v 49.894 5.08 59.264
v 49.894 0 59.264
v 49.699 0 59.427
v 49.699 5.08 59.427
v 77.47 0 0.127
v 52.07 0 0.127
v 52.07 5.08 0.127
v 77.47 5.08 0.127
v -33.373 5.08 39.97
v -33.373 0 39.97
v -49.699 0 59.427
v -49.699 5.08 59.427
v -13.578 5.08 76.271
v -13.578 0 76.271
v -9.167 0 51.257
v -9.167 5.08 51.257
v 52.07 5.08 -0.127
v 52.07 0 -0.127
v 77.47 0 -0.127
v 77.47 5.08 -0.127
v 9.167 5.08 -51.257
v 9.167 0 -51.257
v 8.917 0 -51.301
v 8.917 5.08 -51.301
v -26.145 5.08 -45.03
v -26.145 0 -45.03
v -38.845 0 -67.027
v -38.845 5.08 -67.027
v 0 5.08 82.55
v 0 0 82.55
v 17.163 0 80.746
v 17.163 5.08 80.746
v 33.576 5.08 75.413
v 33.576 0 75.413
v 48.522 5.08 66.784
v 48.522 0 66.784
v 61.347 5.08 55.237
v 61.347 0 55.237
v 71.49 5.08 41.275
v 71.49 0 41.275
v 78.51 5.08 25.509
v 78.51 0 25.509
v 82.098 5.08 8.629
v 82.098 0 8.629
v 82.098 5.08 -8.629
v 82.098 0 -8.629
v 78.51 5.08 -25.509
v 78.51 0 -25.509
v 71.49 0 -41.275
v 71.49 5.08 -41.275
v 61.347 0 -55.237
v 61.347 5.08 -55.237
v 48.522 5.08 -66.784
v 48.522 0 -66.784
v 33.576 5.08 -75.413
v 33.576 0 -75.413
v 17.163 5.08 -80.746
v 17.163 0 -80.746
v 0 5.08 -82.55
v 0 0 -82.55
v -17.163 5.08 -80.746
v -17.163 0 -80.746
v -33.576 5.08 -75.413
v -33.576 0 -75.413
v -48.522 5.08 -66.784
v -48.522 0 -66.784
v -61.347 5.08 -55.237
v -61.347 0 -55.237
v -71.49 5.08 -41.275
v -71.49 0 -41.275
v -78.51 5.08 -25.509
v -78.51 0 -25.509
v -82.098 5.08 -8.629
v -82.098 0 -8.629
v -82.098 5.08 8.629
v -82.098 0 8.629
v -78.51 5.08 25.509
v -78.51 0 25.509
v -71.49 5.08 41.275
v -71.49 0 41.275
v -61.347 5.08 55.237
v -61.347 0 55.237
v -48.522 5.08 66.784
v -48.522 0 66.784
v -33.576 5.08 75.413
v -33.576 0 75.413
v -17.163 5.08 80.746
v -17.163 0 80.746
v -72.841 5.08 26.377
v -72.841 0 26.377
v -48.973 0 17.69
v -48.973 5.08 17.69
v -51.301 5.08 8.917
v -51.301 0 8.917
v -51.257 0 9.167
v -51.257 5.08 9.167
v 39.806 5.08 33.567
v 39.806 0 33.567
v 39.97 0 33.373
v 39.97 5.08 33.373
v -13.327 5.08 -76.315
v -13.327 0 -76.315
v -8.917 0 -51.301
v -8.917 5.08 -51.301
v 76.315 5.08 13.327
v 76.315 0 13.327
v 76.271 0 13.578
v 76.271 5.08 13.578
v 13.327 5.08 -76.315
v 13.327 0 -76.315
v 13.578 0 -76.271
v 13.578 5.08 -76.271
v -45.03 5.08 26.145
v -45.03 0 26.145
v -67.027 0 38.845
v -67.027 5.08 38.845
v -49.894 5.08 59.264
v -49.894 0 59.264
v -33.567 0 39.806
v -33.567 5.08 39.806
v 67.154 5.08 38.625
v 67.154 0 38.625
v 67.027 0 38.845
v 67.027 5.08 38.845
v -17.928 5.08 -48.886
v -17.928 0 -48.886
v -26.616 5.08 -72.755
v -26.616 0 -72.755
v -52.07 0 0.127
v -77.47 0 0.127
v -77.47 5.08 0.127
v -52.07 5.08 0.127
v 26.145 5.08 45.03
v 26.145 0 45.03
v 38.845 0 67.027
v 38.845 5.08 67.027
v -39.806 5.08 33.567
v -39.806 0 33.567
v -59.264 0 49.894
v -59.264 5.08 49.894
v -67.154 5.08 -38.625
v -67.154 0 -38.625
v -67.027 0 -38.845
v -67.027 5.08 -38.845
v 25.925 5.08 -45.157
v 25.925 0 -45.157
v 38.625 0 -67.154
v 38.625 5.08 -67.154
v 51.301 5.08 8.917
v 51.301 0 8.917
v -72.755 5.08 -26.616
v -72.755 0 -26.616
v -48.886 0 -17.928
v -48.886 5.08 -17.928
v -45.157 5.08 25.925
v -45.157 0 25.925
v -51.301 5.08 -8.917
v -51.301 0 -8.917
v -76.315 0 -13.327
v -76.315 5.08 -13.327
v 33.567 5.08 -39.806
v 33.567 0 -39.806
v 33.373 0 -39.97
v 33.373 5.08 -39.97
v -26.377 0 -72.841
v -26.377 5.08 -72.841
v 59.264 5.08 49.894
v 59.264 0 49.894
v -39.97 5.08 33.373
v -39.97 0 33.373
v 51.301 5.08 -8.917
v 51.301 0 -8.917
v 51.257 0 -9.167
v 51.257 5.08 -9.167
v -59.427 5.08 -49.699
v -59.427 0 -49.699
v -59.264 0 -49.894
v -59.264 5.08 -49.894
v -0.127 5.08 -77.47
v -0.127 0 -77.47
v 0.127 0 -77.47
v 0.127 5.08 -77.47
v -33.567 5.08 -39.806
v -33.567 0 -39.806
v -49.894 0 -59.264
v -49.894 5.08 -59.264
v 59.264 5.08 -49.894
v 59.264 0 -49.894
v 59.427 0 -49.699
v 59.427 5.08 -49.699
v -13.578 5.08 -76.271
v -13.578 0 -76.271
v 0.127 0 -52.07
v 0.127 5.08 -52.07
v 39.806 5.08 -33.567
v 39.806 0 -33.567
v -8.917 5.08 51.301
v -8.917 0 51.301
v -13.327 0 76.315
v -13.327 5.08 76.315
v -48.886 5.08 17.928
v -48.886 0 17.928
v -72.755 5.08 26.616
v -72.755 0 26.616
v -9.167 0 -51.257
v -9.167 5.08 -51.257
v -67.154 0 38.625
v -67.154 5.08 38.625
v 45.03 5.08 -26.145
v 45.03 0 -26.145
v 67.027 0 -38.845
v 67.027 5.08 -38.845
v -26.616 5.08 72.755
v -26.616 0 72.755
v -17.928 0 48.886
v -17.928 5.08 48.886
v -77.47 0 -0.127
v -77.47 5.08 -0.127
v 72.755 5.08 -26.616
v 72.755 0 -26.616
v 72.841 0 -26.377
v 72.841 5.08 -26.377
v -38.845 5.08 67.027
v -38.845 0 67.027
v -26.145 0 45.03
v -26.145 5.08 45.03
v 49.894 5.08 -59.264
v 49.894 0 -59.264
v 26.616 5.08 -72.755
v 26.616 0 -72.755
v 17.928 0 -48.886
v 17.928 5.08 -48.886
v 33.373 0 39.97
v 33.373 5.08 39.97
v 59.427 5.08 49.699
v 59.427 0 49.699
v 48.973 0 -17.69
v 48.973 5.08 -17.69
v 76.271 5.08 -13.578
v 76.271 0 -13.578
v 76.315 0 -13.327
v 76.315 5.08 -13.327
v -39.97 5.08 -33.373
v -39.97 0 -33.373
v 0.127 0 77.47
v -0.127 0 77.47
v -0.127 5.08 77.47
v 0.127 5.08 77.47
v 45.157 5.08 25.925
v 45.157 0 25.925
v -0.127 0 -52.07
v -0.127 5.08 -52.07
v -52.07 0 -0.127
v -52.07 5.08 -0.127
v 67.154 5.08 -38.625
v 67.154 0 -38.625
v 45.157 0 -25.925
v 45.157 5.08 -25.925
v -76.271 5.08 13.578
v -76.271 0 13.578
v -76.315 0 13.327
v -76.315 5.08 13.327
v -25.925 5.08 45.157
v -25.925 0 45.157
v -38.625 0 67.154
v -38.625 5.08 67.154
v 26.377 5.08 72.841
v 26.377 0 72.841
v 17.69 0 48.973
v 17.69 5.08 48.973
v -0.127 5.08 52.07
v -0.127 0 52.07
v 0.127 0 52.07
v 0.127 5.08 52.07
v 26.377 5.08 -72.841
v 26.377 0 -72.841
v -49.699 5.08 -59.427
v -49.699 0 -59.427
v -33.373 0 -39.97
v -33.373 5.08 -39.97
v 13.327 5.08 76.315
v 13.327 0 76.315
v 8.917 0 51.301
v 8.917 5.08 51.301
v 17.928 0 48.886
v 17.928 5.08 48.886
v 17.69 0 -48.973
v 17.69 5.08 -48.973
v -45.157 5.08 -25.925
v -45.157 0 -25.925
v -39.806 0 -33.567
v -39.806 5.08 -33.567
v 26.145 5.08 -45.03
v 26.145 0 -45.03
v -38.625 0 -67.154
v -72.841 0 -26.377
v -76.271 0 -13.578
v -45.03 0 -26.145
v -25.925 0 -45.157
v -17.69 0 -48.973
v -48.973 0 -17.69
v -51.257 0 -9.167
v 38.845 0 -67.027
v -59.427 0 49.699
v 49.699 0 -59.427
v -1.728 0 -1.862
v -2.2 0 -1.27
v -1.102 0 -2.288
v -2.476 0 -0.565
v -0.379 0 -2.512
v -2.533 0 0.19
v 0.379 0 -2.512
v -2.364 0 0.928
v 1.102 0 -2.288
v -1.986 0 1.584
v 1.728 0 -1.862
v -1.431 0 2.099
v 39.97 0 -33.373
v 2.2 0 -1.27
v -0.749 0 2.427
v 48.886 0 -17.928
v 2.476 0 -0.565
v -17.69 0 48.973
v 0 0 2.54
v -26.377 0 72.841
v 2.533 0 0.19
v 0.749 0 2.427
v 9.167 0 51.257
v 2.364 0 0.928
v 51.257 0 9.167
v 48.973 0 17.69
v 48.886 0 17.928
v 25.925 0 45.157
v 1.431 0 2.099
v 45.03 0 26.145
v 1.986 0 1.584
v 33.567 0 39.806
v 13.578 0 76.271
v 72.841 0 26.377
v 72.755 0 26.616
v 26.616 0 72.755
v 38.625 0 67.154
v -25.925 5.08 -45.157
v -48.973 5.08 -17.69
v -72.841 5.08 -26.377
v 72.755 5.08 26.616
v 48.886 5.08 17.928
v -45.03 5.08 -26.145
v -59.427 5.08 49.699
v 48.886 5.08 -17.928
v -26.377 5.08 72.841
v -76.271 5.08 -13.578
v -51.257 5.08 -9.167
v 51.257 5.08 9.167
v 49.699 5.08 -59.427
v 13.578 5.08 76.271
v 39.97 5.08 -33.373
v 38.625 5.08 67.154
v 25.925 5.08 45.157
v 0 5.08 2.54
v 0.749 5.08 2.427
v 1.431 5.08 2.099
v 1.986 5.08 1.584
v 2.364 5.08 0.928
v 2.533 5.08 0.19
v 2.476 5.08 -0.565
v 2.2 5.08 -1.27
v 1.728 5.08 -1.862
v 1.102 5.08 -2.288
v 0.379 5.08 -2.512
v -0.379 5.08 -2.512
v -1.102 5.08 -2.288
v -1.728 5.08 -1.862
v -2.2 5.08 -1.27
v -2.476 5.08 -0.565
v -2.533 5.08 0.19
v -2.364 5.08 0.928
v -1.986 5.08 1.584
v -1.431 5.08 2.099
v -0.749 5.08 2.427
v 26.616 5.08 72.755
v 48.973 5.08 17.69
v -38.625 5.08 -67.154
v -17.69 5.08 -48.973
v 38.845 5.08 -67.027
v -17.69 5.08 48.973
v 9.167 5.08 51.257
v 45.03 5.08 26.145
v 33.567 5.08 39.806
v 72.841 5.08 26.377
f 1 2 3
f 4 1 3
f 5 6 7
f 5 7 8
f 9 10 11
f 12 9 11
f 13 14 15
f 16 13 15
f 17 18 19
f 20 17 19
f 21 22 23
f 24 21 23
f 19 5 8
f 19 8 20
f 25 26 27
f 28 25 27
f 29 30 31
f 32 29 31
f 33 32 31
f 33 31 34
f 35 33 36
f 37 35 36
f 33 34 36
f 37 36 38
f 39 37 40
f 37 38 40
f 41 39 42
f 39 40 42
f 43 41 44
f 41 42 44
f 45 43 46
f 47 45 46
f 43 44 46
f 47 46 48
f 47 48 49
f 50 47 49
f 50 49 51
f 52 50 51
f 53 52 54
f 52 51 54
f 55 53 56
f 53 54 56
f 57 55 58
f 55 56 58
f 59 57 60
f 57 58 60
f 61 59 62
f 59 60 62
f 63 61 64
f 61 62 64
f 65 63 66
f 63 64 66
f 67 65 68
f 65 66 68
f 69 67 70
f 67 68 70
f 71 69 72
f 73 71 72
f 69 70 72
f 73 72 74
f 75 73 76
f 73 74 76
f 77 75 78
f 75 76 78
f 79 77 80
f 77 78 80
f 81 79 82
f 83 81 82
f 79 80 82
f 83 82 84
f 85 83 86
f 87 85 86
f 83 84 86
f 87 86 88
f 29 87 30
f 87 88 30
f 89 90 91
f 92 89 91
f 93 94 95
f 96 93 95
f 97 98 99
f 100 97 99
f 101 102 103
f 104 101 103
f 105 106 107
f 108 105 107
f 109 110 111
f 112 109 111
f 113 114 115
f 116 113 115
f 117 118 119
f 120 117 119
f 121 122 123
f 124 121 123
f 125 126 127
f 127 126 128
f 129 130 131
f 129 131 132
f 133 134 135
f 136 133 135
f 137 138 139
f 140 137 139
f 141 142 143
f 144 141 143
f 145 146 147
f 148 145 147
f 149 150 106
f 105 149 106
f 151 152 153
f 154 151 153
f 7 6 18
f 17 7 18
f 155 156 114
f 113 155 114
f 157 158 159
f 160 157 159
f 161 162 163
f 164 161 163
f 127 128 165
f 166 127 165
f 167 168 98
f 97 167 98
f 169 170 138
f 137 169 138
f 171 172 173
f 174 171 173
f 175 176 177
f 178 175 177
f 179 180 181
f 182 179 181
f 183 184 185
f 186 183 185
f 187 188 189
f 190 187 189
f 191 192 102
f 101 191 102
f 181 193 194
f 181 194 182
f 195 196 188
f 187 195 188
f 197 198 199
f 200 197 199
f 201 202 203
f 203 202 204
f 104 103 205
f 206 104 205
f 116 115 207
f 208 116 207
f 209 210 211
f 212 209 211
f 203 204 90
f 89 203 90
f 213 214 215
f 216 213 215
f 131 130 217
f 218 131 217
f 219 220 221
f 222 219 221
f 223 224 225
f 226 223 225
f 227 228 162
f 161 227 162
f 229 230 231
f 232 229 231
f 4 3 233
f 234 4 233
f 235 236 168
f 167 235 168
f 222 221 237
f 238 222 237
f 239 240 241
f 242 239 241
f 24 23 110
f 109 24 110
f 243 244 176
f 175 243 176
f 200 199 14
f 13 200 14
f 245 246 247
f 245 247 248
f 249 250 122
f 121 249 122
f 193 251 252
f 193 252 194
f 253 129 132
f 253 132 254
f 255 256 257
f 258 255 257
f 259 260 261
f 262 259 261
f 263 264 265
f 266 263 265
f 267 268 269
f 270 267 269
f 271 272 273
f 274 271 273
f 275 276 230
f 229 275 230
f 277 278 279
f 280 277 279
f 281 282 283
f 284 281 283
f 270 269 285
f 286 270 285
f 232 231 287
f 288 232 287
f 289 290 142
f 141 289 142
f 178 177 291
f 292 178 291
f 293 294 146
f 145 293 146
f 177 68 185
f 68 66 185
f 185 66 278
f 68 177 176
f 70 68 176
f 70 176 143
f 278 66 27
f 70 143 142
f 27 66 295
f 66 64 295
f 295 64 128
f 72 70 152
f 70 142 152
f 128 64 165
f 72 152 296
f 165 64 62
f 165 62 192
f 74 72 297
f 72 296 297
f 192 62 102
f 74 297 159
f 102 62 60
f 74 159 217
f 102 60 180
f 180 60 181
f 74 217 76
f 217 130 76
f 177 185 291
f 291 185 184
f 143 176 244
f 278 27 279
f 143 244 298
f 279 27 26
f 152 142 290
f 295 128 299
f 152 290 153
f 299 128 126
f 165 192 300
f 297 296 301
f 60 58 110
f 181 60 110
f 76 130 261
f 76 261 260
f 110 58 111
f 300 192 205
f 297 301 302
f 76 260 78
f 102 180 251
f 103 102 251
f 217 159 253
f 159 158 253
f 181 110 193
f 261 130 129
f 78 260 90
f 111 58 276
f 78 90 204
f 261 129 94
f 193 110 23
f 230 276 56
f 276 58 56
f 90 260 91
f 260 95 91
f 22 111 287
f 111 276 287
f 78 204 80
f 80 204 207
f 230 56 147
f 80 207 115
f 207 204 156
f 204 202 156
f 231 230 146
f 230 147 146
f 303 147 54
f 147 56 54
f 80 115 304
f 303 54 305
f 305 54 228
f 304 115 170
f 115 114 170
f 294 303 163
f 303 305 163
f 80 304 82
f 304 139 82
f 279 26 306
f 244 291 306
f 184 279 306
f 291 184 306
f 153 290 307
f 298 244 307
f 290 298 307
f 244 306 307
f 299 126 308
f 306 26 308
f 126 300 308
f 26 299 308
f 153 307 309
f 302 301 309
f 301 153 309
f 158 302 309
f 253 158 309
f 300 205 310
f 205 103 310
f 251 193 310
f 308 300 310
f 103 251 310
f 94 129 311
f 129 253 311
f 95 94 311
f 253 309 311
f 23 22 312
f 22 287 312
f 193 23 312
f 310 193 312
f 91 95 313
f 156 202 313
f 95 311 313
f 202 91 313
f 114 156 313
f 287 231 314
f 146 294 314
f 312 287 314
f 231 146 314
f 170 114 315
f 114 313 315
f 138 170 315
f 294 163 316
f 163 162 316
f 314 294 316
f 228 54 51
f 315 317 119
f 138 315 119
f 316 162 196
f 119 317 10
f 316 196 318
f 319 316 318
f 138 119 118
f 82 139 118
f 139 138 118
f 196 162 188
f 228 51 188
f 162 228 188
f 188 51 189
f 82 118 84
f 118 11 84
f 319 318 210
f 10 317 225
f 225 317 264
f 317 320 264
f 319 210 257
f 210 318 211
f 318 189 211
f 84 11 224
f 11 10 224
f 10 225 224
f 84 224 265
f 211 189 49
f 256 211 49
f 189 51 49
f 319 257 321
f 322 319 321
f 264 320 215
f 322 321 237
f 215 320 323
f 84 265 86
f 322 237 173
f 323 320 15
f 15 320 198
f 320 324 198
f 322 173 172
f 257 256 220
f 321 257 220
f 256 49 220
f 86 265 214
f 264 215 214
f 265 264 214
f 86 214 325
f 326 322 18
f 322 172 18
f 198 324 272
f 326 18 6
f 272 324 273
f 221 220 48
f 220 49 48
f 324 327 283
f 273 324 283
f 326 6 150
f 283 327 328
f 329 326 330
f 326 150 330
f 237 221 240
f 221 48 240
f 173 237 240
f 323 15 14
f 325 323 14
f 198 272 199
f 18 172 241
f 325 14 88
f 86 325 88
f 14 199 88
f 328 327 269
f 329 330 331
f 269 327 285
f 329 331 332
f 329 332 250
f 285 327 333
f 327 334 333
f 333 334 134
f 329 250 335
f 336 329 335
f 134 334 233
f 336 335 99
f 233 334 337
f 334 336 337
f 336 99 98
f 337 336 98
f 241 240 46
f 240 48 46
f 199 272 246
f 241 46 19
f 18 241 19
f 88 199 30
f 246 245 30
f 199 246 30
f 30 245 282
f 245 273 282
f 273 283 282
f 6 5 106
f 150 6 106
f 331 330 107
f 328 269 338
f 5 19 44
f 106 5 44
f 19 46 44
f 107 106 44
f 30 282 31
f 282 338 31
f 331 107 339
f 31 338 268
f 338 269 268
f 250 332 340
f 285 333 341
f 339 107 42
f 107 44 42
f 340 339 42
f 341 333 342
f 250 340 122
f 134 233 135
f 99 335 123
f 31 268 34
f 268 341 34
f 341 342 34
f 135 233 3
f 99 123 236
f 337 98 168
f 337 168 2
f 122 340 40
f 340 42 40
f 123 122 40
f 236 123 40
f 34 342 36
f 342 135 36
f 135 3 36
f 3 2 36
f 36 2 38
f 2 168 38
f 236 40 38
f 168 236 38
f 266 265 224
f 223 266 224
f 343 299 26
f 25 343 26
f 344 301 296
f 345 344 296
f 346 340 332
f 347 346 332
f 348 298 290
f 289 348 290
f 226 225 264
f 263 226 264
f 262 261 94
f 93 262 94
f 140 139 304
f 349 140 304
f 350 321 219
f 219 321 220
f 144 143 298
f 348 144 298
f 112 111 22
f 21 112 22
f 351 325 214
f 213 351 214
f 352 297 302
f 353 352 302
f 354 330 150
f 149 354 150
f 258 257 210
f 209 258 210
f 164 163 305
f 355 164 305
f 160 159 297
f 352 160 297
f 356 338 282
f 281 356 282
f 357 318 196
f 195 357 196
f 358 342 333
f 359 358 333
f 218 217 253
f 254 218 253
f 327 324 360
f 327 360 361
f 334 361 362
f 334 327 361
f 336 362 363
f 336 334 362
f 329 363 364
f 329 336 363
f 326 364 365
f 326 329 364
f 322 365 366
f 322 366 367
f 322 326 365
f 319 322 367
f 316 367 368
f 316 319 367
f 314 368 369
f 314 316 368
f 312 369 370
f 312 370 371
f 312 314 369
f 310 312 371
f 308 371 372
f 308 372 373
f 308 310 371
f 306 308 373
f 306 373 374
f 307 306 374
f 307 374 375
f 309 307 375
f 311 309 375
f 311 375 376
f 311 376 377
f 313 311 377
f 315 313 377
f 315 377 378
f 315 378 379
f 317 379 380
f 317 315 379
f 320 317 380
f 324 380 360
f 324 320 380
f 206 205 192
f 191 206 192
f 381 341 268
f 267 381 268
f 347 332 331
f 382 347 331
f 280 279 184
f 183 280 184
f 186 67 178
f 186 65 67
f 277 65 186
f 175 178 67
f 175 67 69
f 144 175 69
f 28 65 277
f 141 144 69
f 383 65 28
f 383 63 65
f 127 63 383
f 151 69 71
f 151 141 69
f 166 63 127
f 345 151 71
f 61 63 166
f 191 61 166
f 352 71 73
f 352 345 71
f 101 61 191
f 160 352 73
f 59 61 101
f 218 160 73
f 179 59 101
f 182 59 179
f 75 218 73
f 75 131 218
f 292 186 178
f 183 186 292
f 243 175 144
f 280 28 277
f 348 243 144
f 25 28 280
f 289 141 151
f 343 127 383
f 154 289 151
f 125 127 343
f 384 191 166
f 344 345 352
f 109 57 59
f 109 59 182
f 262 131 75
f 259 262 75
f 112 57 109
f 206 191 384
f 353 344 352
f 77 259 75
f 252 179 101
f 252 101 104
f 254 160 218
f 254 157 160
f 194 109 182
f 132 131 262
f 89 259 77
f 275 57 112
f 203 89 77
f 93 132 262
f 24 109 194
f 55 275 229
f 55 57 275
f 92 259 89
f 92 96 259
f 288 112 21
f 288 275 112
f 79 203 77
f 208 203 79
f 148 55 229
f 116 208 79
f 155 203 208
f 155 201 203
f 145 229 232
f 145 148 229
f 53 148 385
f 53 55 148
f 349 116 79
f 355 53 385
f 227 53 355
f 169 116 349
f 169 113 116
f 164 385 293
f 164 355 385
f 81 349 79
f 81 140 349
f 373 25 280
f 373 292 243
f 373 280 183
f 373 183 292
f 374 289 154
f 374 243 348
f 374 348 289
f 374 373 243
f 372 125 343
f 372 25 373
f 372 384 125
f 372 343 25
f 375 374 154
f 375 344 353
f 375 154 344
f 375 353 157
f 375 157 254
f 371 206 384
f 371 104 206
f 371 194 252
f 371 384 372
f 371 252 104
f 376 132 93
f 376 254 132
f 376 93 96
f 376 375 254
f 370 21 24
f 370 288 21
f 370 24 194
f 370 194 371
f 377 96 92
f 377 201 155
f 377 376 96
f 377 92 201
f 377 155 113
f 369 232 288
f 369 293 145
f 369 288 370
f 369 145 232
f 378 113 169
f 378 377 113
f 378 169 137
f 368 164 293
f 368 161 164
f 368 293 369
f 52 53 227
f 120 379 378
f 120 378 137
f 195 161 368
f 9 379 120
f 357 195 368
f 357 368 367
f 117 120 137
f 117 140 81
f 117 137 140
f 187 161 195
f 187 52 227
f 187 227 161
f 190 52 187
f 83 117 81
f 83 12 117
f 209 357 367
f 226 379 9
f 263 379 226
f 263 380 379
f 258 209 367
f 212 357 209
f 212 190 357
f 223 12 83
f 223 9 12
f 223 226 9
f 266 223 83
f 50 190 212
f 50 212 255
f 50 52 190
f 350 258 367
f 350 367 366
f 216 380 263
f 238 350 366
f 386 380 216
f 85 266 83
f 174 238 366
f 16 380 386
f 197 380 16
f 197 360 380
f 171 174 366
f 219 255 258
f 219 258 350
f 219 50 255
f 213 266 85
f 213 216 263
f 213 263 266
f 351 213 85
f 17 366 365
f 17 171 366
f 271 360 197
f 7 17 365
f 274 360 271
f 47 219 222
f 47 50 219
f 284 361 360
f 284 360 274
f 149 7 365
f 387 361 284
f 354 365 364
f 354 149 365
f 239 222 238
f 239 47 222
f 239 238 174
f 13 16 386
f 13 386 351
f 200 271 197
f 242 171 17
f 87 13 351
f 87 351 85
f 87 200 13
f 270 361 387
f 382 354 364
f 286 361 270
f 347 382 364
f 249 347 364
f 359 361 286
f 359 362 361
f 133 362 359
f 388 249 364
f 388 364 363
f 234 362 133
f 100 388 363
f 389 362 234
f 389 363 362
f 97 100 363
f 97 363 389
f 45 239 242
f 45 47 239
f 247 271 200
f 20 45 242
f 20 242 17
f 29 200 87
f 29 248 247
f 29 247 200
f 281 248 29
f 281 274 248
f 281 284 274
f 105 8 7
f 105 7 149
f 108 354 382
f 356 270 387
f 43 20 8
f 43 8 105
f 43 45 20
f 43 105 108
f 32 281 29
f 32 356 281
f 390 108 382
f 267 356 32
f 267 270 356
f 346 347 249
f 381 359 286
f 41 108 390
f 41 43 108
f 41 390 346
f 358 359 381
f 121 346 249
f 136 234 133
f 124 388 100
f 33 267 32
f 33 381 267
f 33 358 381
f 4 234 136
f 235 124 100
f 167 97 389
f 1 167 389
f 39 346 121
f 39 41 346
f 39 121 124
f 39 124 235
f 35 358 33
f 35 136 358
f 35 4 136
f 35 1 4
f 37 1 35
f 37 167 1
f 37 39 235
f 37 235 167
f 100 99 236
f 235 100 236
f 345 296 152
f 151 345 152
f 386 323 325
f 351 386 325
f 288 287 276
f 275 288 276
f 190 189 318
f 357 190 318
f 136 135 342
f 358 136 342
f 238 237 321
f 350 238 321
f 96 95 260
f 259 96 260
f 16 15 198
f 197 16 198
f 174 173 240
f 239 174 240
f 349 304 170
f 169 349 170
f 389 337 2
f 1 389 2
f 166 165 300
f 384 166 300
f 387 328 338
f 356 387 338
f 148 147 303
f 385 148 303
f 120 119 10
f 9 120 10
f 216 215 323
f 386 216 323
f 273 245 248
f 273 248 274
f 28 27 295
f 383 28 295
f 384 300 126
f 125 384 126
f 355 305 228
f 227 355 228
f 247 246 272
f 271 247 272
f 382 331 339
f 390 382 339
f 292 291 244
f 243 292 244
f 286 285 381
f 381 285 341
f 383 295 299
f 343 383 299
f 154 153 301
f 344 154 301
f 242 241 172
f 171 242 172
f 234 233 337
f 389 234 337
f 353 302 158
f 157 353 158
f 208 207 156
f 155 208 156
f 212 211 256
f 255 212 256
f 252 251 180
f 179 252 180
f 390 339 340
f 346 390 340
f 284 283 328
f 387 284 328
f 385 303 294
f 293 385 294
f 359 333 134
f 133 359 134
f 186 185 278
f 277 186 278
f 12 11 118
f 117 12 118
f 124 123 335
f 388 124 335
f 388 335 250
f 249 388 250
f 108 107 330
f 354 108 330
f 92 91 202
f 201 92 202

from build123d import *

# Parameters (mm, degrees)
SKETCH1_R           = 82.55
SKETCH1_R_2         = 2.54
SKETCH1_W           = 0.254
SKETCH1_H           = 25.4
SKETCH1_W_2         = 25.4
SKETCH1_H_2         = 0.254
BOSS_EXTRUDE1_DEPTH = 5.08


with BuildPart() as part:
    # Sketch1 → Boss-Extrude1 (new body)
    with BuildSketch(Plane(origin=(0, 0, 0), x_dir=(1, 0, 0), z_dir=(0, 1, 0))):
        with Locations(Location((0, 0, 0), (0, 0, 270))):
            Circle(SKETCH1_R)
        with Locations(Location((0, 0, 0), (0, 0, 270))):
            Circle(SKETCH1_R_2, mode=Mode.SUBTRACT)
        Polygon((13.327453739, 76.315109944), (13.577594908, 76.271003307), (9.166931196, 51.256886381), (8.916790026, 51.300993018), align=None, mode=Mode.SUBTRACT)
        with Locations((0, 64.77)):
            Rectangle(SKETCH1_W, SKETCH1_H, mode=Mode.SUBTRACT)
        Polygon((26.376959541, 72.84142389), (26.615641466, 72.754550774), (17.928329826, 48.886358206), (17.6896479, 48.973231323), align=None, mode=Mode.SUBTRACT)
        Polygon((38.625014774, 67.154488031), (38.844985226, 67.027488031), (26.144985226, 45.030442775), (25.925014774, 45.157442775), align=None, mode=Mode.SUBTRACT)
        Polygon((49.699468478, 59.427097035), (49.894043767, 59.263828982), (33.567238481, 39.806300127), (33.372663192, 39.96956818), align=None, mode=Mode.SUBTRACT)
        Polygon((59.263828982, 49.894043767), (59.427097035, 49.699468478), (39.96956818, 33.372663192), (39.806300127, 33.567238481), align=None, mode=Mode.SUBTRACT)
        Polygon((67.027488031, 38.844985226), (67.154488031, 38.625014774), (45.157442775, 25.925014774), (45.030442775, 26.144985226), align=None, mode=Mode.SUBTRACT)
        Polygon((72.754550774, 26.615641466), (72.84142389, 26.376959541), (48.973231323, 17.6896479), (48.886358206, 17.928329826), align=None, mode=Mode.SUBTRACT)
        Polygon((76.271003307, 13.577594908), (76.315109944, 13.327453739), (51.300993018, 8.916790026), (51.256886381, 9.166931196), align=None, mode=Mode.SUBTRACT)
        with Locations((64.77, 0)):
            Rectangle(SKETCH1_W_2, SKETCH1_H_2, mode=Mode.SUBTRACT)
        Polygon((76.315109944, -13.327453739), (76.271003307, -13.577594908), (51.256886381, -9.166931196), (51.300993018, -8.916790026), align=None, mode=Mode.SUBTRACT)
        Polygon((72.84142389, -26.376959541), (72.754550774, -26.615641466), (48.886358206, -17.928329826), (48.973231323, -17.6896479), align=None, mode=Mode.SUBTRACT)
        Polygon((67.154488031, -38.625014774), (67.027488031, -38.844985226), (45.030442775, -26.144985226), (45.157442775, -25.925014774), align=None, mode=Mode.SUBTRACT)
        Polygon((59.427097035, -49.699468478), (59.263828982, -49.894043767), (39.806300127, -33.567238481), (39.96956818, -33.372663192), align=None, mode=Mode.SUBTRACT)
        Polygon((49.894043767, -59.263828982), (49.699468478, -59.427097035), (33.372663192, -39.96956818), (33.567238481, -39.806300127), align=None, mode=Mode.SUBTRACT)
        Polygon((38.844985226, -67.027488031), (38.625014774, -67.154488031), (25.925014774, -45.157442775), (26.144985226, -45.030442775), align=None, mode=Mode.SUBTRACT)
        Polygon((26.615641466, -72.754550774), (26.376959541, -72.84142389), (17.6896479, -48.973231323), (17.928329826, -48.886358206), align=None, mode=Mode.SUBTRACT)
        Polygon((13.577594908, -76.271003307), (13.327453739, -76.315109944), (8.916790026, -51.300993018), (9.166931196, -51.256886381), align=None, mode=Mode.SUBTRACT)
        with Locations((0, -64.77)):
            Rectangle(SKETCH1_W, SKETCH1_H, mode=Mode.SUBTRACT)
        Polygon((-13.327453739, -76.315109944), (-13.577594908, -76.271003307), (-9.166931196, -51.256886381), (-8.916790026, -51.300993018), align=None, mode=Mode.SUBTRACT)
        Polygon((-26.376959541, -72.84142389), (-26.615641466, -72.754550774), (-17.928329826, -48.886358206), (-17.6896479, -48.973231323), align=None, mode=Mode.SUBTRACT)
        Polygon((-38.625014774, -67.154488031), (-38.844985226, -67.027488031), (-26.144985226, -45.030442775), (-25.925014774, -45.157442775), align=None, mode=Mode.SUBTRACT)
        Polygon((-49.699468478, -59.427097035), (-49.894043767, -59.263828982), (-33.567238481, -39.806300127), (-33.372663192, -39.96956818), align=None, mode=Mode.SUBTRACT)
        Polygon((-59.263828982, -49.894043767), (-59.427097035, -49.699468478), (-39.96956818, -33.372663192), (-39.806300127, -33.567238481), align=None, mode=Mode.SUBTRACT)
        Polygon((-67.027488031, -38.844985226), (-67.154488031, -38.625014774), (-45.157442775, -25.925014774), (-45.030442775, -26.144985226), align=None, mode=Mode.SUBTRACT)
        Polygon((-72.754550774, -26.615641466), (-72.84142389, -26.376959541), (-48.973231323, -17.6896479), (-48.886358206, -17.928329826), align=None, mode=Mode.SUBTRACT)
        Polygon((-76.271003307, -13.577594908), (-76.315109944, -13.327453739), (-51.300993018, -8.916790026), (-51.256886381, -9.166931196), align=None, mode=Mode.SUBTRACT)
        with Locations((-64.77, 0)):
            Rectangle(SKETCH1_W_2, SKETCH1_H_2, mode=Mode.SUBTRACT)
        Polygon((-76.315109944, 13.327453739), (-76.271003307, 13.577594908), (-51.256886381, 9.166931196), (-51.300993018, 8.916790026), align=None, mode=Mode.SUBTRACT)
        Polygon((-72.84142389, 26.376959541), (-72.754550774, 26.615641466), (-48.886358206, 17.928329826), (-48.973231323, 17.6896479), align=None, mode=Mode.SUBTRACT)
        Polygon((-67.154488031, 38.625014774), (-67.027488031, 38.844985226), (-45.030442775, 26.144985226), (-45.157442775, 25.925014774), align=None, mode=Mode.SUBTRACT)
        Polygon((-59.427097035, 49.699468478), (-59.263828982, 49.894043767), (-39.806300127, 33.567238481), (-39.96956818, 33.372663192), align=None, mode=Mode.SUBTRACT)
        Polygon((-49.894043767, 59.263828982), (-49.699468478, 59.427097035), (-33.372663192, 39.96956818), (-33.567238481, 39.806300127), align=None, mode=Mode.SUBTRACT)
        Polygon((-38.844985226, 67.027488031), (-38.625014774, 67.154488031), (-25.925014774, 45.157442775), (-26.144985226, 45.030442775), align=None, mode=Mode.SUBTRACT)
        Polygon((-26.615641466, 72.754550774), (-26.376959541, 72.84142389), (-17.6896479, 48.973231323), (-17.928329826, 48.886358206), align=None, mode=Mode.SUBTRACT)
        Polygon((-13.577594908, 76.271003307), (-13.327453739, 76.315109944), (-8.916790026, 51.300993018), (-9.166931196, 51.256886381), align=None, mode=Mode.SUBTRACT)
    extrude(amount=BOSS_EXTRUDE1_DEPTH)


solid = part.part
